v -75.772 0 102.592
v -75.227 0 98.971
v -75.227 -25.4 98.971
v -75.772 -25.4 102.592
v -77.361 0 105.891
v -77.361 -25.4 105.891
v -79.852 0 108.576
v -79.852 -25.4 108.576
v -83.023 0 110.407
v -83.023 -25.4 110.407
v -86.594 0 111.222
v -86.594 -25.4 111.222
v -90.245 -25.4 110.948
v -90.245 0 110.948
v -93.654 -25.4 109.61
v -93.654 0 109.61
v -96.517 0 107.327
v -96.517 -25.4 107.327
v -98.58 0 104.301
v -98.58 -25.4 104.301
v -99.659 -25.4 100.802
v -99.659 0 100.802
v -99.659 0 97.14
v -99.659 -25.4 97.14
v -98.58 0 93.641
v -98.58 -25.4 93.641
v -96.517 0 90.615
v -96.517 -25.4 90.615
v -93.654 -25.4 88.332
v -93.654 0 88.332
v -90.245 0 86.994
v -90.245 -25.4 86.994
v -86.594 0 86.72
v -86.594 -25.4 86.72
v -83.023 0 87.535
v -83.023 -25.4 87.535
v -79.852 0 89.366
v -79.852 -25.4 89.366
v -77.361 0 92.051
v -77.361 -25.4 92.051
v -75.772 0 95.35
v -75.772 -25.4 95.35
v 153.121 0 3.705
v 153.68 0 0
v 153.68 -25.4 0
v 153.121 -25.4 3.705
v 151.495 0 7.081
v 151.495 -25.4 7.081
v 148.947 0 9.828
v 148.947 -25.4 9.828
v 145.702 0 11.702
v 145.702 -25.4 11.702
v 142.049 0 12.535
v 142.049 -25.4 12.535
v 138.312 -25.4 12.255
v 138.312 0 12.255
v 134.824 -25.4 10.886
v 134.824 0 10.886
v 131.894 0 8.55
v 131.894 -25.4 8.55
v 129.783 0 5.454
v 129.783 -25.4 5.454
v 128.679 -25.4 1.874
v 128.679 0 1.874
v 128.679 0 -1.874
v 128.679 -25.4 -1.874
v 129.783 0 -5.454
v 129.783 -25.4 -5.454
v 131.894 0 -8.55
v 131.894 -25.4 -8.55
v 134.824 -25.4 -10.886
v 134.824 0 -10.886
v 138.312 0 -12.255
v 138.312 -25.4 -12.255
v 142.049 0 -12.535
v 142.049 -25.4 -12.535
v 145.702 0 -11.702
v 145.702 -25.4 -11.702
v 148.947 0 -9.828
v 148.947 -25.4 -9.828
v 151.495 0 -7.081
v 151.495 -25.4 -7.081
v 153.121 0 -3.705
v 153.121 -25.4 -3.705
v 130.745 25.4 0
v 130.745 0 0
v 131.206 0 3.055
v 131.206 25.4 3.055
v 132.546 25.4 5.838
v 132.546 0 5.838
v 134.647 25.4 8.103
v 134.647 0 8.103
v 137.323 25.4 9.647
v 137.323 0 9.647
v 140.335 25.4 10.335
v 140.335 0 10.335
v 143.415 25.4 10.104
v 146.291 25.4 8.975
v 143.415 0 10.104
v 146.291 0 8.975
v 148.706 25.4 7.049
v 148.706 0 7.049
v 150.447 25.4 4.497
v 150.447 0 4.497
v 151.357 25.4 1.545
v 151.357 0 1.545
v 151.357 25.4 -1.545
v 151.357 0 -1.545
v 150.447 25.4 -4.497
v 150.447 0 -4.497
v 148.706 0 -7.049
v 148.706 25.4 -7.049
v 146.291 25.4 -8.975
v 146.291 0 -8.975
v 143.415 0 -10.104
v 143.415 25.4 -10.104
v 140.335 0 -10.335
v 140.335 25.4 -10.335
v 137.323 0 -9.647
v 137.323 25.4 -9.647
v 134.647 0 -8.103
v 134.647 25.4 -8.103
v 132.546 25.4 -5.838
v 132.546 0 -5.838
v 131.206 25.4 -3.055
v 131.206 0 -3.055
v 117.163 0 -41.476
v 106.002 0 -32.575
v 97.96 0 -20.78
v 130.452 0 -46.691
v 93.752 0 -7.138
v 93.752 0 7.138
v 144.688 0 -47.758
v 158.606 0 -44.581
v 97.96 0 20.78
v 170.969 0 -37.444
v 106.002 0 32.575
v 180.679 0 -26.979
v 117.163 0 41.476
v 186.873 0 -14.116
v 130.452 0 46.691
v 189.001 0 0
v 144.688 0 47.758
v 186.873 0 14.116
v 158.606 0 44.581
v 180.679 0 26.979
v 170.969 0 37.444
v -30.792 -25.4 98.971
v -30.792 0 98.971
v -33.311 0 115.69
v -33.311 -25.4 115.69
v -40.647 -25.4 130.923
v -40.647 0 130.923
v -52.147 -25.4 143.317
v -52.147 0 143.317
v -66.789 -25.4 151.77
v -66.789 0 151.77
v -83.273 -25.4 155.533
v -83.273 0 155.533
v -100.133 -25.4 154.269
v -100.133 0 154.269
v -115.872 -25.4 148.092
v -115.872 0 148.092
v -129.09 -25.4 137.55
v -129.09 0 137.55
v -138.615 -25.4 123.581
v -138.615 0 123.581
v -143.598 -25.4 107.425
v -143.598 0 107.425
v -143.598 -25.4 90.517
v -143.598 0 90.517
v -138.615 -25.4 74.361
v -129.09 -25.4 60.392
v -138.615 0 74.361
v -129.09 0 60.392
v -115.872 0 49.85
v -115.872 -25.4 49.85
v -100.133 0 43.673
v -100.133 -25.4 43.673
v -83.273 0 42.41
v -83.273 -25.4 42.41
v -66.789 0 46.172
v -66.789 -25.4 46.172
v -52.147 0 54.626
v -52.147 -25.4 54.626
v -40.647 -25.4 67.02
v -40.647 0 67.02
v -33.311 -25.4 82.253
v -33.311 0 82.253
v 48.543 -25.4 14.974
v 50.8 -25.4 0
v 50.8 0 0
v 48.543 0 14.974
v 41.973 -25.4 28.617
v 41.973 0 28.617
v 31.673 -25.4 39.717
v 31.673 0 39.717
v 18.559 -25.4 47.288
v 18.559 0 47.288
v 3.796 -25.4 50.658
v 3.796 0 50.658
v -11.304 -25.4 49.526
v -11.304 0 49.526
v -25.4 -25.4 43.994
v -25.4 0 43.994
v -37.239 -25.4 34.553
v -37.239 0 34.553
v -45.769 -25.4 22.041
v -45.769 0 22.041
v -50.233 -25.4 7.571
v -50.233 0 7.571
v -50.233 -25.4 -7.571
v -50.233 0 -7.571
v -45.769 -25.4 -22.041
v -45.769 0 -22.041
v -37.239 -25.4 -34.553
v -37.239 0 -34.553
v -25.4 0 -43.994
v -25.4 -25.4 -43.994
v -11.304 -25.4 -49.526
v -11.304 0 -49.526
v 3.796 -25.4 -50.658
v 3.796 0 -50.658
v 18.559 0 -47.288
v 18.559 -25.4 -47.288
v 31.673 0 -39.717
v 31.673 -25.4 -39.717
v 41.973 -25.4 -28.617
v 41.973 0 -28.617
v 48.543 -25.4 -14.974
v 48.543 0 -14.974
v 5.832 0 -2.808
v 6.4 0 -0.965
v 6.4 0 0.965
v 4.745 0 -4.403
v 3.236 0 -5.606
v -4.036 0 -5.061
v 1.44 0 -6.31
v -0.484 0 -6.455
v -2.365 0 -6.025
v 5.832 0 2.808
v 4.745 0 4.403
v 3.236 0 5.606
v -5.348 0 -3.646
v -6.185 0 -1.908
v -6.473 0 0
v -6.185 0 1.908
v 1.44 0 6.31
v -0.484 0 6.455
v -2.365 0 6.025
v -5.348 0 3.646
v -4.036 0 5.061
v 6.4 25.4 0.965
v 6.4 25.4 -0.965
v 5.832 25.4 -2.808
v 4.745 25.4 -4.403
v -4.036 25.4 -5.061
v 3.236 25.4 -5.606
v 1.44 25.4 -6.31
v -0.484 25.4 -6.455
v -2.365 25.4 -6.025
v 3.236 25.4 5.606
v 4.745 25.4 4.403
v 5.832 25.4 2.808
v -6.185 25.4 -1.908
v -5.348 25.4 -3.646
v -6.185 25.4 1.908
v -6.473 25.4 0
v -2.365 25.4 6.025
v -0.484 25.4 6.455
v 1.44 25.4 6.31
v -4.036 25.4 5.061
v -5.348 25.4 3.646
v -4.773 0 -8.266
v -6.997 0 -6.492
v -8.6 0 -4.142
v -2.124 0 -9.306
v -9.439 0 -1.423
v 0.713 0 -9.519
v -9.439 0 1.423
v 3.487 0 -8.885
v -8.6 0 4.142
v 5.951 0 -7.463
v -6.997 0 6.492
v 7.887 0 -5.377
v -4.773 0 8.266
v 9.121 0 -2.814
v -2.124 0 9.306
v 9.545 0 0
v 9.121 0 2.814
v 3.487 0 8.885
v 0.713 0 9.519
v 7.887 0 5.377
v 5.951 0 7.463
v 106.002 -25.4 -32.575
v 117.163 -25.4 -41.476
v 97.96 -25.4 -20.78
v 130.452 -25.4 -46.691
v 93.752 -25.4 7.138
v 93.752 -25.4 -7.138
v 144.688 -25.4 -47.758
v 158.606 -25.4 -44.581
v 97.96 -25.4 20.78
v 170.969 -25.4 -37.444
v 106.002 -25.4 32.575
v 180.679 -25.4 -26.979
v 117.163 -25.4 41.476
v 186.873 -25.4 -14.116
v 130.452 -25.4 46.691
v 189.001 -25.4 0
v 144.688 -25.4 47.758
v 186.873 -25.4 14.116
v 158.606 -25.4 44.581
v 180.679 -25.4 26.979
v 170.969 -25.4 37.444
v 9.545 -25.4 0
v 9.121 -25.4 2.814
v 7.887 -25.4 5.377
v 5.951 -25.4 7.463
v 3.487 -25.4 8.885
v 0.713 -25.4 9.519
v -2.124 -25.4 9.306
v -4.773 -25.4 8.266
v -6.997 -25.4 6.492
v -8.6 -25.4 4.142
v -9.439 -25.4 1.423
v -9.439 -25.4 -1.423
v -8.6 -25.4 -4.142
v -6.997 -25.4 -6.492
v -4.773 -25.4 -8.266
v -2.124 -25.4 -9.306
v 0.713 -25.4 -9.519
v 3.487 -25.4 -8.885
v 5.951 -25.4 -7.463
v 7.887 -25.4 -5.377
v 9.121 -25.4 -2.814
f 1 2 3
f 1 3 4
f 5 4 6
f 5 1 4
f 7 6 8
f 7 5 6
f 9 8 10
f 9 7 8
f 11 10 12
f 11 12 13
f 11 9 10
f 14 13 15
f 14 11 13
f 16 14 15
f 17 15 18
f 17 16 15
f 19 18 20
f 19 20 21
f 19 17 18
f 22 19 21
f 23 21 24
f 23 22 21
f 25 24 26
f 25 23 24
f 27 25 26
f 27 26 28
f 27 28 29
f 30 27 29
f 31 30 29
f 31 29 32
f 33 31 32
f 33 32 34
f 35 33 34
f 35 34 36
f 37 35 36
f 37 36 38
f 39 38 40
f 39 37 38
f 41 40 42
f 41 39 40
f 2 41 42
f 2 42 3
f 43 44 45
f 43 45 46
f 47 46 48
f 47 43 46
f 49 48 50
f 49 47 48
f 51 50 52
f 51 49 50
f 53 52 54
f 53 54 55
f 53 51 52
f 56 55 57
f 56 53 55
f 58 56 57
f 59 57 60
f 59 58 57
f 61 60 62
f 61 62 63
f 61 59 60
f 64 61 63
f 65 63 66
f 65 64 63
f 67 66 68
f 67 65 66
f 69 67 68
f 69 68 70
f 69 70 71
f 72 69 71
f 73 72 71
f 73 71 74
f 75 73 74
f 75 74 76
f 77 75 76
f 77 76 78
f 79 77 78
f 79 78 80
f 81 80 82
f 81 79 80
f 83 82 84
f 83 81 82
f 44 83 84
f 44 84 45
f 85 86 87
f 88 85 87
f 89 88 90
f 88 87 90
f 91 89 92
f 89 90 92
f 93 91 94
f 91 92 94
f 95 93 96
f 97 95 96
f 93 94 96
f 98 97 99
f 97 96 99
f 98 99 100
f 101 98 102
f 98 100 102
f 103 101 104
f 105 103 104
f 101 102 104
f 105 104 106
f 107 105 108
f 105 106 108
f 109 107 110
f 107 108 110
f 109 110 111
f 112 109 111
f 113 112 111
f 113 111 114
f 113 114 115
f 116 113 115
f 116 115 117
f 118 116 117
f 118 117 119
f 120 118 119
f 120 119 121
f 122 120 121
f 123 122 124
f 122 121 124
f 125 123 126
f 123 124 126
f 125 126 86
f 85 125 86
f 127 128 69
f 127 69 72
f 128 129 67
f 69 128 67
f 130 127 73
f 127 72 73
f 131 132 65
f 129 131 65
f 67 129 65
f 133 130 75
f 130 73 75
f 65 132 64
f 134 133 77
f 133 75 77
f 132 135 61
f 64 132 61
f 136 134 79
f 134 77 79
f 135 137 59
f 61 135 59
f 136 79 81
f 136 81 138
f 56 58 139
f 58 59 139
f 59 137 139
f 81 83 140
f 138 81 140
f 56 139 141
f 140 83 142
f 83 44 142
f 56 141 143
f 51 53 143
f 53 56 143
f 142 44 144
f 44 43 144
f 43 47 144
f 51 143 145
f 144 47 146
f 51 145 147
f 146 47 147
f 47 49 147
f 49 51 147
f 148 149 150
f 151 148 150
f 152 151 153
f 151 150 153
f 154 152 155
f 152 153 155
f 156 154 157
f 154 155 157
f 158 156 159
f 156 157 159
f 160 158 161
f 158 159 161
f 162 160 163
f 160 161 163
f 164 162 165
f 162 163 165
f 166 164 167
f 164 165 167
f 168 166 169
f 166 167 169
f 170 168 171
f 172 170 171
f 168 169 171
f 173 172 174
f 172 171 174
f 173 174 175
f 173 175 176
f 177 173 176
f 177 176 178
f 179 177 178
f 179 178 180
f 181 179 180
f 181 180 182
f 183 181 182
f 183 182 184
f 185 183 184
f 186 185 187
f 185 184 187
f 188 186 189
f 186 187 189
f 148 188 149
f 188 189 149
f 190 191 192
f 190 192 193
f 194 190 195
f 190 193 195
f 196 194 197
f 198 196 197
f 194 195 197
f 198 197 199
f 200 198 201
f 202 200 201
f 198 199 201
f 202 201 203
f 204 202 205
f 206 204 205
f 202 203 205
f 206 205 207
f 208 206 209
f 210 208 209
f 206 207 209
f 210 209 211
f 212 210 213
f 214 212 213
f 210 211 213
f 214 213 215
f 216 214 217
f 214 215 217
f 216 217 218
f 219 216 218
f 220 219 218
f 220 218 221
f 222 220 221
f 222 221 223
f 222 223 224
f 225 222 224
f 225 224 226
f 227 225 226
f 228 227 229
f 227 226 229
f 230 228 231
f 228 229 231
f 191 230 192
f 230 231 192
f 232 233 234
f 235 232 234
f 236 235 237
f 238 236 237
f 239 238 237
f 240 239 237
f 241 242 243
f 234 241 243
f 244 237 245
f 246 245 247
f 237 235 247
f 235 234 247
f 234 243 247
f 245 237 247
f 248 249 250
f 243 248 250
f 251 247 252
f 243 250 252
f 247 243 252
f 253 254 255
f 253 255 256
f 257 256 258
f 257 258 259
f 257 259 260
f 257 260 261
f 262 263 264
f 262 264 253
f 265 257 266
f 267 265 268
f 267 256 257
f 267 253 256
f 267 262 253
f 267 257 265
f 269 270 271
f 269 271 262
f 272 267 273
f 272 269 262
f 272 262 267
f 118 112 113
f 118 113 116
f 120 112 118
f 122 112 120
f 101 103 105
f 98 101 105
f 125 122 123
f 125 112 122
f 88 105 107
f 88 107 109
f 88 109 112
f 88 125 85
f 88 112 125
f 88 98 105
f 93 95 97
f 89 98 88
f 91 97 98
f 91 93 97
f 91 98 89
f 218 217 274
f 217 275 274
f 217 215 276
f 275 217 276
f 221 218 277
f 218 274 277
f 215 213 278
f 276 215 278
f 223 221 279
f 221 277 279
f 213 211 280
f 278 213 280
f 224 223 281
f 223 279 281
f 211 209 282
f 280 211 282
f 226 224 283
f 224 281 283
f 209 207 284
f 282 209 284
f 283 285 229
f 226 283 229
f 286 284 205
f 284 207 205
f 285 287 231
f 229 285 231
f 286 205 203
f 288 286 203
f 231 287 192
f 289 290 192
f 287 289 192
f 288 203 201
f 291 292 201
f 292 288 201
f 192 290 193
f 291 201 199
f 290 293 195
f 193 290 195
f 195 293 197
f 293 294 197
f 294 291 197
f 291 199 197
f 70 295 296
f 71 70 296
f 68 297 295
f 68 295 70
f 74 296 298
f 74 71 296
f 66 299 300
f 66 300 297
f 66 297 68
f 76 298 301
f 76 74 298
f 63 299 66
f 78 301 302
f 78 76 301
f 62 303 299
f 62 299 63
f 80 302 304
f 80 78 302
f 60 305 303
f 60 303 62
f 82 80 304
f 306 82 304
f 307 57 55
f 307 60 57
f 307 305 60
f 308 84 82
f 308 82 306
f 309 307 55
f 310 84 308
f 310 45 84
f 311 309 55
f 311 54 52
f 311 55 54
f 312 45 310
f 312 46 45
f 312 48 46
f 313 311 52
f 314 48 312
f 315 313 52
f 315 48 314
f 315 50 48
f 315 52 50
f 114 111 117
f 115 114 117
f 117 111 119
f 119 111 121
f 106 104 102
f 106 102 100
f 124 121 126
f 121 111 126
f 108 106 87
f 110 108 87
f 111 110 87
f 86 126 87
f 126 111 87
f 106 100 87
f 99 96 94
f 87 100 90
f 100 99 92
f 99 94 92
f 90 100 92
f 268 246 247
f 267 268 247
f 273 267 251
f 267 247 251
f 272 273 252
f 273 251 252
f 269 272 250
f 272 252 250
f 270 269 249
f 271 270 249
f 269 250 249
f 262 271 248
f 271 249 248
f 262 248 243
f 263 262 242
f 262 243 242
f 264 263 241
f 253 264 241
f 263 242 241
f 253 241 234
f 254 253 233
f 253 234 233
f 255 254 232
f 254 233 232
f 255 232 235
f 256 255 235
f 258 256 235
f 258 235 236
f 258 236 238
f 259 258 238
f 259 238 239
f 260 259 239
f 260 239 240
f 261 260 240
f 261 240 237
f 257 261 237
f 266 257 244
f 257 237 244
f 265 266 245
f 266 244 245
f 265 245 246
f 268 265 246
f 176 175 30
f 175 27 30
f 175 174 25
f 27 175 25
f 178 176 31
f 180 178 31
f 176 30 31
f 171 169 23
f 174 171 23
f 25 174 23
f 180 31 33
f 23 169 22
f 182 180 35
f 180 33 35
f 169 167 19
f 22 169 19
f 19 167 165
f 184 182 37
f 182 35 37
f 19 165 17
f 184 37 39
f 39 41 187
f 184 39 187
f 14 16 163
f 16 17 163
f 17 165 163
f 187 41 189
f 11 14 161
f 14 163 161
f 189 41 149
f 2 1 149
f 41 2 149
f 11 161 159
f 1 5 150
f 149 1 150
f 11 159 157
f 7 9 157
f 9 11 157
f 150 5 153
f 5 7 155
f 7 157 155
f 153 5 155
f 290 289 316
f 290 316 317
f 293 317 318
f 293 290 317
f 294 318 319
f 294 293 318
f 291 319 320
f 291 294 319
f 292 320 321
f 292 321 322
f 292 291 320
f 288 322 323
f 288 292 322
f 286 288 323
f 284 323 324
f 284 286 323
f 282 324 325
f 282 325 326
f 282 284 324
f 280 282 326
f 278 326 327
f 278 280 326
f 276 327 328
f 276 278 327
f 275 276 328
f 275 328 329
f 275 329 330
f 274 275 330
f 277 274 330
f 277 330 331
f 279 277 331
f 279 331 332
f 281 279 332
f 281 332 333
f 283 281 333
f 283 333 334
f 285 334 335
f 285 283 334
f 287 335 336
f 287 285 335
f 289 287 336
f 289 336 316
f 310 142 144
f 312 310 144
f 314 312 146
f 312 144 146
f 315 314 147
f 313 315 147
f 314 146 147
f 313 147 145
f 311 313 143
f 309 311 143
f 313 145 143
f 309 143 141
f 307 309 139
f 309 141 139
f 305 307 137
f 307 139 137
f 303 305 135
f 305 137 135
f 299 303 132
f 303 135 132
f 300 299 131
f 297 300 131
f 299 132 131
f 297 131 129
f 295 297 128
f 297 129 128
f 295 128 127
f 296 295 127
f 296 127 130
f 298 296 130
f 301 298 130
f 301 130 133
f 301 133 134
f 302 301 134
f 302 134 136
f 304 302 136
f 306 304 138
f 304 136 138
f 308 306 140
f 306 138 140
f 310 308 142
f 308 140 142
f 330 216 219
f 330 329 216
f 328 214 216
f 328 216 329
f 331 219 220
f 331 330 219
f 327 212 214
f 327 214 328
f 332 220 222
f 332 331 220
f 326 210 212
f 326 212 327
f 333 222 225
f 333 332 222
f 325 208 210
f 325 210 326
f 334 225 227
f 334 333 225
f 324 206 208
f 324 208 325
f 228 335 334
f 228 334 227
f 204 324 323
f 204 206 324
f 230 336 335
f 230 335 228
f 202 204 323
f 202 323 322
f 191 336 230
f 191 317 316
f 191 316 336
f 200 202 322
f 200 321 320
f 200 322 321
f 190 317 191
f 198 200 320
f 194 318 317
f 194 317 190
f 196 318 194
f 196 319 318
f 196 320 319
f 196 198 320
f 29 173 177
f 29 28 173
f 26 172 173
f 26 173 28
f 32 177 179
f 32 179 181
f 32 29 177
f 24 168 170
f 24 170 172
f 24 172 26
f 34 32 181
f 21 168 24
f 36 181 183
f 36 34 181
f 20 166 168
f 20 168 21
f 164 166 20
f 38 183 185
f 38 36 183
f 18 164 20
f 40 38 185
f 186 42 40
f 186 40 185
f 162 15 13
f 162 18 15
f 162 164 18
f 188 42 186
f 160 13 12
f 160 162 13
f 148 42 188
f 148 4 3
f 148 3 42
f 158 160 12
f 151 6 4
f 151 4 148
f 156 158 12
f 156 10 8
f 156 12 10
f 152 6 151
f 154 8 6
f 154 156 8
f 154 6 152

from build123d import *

# Parameters (mm, degrees)
F0_R     = 50.8
F0_R_2   = 9.545298
F1_DEPTH = 25.4
F2_R     = 56.720042
F2_R_2   = 12.285001
F3_DEPTH = 25.4
F4_R     = 47.892054
F4_R_2   = 12.570601
F5_DEPTH = 25.4
F6_R     = 10.363849
F7_DEPTH = 25.4
F8_R     = 6.472703
F9_DEPTH = 25.4


with BuildPart() as f1:
    # F0 (on Front) → F1 (new body)
    with BuildSketch(Plane.XZ):
        Circle(F0_R)
        Circle(F0_R_2, mode=Mode.SUBTRACT)
    extrude(amount=F1_DEPTH)


with BuildPart() as f3:
    # F2 (on Front) → F3 (new body)
    with BuildSketch(Plane.XZ):
        with Locations((-87.511577, 98.971069)):
            Circle(F2_R)
        with Locations((-87.511577, 98.971069)):
            Circle(F2_R_2, mode=Mode.SUBTRACT)
    extrude(amount=F3_DEPTH)


with BuildPart() as f5:
    # F4 (on Front) → F5 (new body)
    with BuildSketch(Plane.XZ):
        with Locations((141.109124, 0)):
            Circle(F4_R)
        with Locations((141.109124, 0)):
            Circle(F4_R_2, mode=Mode.SUBTRACT)
    extrude(amount=F5_DEPTH)


with BuildPart() as f7:
    # F6 (on face) → F7 (new body)
    with BuildSketch(Plane(origin=(0, 0, 0), x_dir=(-1, 0, 0), z_dir=(0, 1, 0))):
        with Locations((-141.109124, 0)):
            Circle(F6_R)
    extrude(amount=F7_DEPTH)


with BuildPart() as f9:
    # F8 (on face) → F9 (new body)
    with BuildSketch(Plane(origin=(0, 0, 0), x_dir=(-1, 0, 0), z_dir=(0, 1, 0))):
        Circle(F8_R)
    extrude(amount=F9_DEPTH)


solid = Compound([f1.part, f3.part, f5.part, f7.part, f9.part])
